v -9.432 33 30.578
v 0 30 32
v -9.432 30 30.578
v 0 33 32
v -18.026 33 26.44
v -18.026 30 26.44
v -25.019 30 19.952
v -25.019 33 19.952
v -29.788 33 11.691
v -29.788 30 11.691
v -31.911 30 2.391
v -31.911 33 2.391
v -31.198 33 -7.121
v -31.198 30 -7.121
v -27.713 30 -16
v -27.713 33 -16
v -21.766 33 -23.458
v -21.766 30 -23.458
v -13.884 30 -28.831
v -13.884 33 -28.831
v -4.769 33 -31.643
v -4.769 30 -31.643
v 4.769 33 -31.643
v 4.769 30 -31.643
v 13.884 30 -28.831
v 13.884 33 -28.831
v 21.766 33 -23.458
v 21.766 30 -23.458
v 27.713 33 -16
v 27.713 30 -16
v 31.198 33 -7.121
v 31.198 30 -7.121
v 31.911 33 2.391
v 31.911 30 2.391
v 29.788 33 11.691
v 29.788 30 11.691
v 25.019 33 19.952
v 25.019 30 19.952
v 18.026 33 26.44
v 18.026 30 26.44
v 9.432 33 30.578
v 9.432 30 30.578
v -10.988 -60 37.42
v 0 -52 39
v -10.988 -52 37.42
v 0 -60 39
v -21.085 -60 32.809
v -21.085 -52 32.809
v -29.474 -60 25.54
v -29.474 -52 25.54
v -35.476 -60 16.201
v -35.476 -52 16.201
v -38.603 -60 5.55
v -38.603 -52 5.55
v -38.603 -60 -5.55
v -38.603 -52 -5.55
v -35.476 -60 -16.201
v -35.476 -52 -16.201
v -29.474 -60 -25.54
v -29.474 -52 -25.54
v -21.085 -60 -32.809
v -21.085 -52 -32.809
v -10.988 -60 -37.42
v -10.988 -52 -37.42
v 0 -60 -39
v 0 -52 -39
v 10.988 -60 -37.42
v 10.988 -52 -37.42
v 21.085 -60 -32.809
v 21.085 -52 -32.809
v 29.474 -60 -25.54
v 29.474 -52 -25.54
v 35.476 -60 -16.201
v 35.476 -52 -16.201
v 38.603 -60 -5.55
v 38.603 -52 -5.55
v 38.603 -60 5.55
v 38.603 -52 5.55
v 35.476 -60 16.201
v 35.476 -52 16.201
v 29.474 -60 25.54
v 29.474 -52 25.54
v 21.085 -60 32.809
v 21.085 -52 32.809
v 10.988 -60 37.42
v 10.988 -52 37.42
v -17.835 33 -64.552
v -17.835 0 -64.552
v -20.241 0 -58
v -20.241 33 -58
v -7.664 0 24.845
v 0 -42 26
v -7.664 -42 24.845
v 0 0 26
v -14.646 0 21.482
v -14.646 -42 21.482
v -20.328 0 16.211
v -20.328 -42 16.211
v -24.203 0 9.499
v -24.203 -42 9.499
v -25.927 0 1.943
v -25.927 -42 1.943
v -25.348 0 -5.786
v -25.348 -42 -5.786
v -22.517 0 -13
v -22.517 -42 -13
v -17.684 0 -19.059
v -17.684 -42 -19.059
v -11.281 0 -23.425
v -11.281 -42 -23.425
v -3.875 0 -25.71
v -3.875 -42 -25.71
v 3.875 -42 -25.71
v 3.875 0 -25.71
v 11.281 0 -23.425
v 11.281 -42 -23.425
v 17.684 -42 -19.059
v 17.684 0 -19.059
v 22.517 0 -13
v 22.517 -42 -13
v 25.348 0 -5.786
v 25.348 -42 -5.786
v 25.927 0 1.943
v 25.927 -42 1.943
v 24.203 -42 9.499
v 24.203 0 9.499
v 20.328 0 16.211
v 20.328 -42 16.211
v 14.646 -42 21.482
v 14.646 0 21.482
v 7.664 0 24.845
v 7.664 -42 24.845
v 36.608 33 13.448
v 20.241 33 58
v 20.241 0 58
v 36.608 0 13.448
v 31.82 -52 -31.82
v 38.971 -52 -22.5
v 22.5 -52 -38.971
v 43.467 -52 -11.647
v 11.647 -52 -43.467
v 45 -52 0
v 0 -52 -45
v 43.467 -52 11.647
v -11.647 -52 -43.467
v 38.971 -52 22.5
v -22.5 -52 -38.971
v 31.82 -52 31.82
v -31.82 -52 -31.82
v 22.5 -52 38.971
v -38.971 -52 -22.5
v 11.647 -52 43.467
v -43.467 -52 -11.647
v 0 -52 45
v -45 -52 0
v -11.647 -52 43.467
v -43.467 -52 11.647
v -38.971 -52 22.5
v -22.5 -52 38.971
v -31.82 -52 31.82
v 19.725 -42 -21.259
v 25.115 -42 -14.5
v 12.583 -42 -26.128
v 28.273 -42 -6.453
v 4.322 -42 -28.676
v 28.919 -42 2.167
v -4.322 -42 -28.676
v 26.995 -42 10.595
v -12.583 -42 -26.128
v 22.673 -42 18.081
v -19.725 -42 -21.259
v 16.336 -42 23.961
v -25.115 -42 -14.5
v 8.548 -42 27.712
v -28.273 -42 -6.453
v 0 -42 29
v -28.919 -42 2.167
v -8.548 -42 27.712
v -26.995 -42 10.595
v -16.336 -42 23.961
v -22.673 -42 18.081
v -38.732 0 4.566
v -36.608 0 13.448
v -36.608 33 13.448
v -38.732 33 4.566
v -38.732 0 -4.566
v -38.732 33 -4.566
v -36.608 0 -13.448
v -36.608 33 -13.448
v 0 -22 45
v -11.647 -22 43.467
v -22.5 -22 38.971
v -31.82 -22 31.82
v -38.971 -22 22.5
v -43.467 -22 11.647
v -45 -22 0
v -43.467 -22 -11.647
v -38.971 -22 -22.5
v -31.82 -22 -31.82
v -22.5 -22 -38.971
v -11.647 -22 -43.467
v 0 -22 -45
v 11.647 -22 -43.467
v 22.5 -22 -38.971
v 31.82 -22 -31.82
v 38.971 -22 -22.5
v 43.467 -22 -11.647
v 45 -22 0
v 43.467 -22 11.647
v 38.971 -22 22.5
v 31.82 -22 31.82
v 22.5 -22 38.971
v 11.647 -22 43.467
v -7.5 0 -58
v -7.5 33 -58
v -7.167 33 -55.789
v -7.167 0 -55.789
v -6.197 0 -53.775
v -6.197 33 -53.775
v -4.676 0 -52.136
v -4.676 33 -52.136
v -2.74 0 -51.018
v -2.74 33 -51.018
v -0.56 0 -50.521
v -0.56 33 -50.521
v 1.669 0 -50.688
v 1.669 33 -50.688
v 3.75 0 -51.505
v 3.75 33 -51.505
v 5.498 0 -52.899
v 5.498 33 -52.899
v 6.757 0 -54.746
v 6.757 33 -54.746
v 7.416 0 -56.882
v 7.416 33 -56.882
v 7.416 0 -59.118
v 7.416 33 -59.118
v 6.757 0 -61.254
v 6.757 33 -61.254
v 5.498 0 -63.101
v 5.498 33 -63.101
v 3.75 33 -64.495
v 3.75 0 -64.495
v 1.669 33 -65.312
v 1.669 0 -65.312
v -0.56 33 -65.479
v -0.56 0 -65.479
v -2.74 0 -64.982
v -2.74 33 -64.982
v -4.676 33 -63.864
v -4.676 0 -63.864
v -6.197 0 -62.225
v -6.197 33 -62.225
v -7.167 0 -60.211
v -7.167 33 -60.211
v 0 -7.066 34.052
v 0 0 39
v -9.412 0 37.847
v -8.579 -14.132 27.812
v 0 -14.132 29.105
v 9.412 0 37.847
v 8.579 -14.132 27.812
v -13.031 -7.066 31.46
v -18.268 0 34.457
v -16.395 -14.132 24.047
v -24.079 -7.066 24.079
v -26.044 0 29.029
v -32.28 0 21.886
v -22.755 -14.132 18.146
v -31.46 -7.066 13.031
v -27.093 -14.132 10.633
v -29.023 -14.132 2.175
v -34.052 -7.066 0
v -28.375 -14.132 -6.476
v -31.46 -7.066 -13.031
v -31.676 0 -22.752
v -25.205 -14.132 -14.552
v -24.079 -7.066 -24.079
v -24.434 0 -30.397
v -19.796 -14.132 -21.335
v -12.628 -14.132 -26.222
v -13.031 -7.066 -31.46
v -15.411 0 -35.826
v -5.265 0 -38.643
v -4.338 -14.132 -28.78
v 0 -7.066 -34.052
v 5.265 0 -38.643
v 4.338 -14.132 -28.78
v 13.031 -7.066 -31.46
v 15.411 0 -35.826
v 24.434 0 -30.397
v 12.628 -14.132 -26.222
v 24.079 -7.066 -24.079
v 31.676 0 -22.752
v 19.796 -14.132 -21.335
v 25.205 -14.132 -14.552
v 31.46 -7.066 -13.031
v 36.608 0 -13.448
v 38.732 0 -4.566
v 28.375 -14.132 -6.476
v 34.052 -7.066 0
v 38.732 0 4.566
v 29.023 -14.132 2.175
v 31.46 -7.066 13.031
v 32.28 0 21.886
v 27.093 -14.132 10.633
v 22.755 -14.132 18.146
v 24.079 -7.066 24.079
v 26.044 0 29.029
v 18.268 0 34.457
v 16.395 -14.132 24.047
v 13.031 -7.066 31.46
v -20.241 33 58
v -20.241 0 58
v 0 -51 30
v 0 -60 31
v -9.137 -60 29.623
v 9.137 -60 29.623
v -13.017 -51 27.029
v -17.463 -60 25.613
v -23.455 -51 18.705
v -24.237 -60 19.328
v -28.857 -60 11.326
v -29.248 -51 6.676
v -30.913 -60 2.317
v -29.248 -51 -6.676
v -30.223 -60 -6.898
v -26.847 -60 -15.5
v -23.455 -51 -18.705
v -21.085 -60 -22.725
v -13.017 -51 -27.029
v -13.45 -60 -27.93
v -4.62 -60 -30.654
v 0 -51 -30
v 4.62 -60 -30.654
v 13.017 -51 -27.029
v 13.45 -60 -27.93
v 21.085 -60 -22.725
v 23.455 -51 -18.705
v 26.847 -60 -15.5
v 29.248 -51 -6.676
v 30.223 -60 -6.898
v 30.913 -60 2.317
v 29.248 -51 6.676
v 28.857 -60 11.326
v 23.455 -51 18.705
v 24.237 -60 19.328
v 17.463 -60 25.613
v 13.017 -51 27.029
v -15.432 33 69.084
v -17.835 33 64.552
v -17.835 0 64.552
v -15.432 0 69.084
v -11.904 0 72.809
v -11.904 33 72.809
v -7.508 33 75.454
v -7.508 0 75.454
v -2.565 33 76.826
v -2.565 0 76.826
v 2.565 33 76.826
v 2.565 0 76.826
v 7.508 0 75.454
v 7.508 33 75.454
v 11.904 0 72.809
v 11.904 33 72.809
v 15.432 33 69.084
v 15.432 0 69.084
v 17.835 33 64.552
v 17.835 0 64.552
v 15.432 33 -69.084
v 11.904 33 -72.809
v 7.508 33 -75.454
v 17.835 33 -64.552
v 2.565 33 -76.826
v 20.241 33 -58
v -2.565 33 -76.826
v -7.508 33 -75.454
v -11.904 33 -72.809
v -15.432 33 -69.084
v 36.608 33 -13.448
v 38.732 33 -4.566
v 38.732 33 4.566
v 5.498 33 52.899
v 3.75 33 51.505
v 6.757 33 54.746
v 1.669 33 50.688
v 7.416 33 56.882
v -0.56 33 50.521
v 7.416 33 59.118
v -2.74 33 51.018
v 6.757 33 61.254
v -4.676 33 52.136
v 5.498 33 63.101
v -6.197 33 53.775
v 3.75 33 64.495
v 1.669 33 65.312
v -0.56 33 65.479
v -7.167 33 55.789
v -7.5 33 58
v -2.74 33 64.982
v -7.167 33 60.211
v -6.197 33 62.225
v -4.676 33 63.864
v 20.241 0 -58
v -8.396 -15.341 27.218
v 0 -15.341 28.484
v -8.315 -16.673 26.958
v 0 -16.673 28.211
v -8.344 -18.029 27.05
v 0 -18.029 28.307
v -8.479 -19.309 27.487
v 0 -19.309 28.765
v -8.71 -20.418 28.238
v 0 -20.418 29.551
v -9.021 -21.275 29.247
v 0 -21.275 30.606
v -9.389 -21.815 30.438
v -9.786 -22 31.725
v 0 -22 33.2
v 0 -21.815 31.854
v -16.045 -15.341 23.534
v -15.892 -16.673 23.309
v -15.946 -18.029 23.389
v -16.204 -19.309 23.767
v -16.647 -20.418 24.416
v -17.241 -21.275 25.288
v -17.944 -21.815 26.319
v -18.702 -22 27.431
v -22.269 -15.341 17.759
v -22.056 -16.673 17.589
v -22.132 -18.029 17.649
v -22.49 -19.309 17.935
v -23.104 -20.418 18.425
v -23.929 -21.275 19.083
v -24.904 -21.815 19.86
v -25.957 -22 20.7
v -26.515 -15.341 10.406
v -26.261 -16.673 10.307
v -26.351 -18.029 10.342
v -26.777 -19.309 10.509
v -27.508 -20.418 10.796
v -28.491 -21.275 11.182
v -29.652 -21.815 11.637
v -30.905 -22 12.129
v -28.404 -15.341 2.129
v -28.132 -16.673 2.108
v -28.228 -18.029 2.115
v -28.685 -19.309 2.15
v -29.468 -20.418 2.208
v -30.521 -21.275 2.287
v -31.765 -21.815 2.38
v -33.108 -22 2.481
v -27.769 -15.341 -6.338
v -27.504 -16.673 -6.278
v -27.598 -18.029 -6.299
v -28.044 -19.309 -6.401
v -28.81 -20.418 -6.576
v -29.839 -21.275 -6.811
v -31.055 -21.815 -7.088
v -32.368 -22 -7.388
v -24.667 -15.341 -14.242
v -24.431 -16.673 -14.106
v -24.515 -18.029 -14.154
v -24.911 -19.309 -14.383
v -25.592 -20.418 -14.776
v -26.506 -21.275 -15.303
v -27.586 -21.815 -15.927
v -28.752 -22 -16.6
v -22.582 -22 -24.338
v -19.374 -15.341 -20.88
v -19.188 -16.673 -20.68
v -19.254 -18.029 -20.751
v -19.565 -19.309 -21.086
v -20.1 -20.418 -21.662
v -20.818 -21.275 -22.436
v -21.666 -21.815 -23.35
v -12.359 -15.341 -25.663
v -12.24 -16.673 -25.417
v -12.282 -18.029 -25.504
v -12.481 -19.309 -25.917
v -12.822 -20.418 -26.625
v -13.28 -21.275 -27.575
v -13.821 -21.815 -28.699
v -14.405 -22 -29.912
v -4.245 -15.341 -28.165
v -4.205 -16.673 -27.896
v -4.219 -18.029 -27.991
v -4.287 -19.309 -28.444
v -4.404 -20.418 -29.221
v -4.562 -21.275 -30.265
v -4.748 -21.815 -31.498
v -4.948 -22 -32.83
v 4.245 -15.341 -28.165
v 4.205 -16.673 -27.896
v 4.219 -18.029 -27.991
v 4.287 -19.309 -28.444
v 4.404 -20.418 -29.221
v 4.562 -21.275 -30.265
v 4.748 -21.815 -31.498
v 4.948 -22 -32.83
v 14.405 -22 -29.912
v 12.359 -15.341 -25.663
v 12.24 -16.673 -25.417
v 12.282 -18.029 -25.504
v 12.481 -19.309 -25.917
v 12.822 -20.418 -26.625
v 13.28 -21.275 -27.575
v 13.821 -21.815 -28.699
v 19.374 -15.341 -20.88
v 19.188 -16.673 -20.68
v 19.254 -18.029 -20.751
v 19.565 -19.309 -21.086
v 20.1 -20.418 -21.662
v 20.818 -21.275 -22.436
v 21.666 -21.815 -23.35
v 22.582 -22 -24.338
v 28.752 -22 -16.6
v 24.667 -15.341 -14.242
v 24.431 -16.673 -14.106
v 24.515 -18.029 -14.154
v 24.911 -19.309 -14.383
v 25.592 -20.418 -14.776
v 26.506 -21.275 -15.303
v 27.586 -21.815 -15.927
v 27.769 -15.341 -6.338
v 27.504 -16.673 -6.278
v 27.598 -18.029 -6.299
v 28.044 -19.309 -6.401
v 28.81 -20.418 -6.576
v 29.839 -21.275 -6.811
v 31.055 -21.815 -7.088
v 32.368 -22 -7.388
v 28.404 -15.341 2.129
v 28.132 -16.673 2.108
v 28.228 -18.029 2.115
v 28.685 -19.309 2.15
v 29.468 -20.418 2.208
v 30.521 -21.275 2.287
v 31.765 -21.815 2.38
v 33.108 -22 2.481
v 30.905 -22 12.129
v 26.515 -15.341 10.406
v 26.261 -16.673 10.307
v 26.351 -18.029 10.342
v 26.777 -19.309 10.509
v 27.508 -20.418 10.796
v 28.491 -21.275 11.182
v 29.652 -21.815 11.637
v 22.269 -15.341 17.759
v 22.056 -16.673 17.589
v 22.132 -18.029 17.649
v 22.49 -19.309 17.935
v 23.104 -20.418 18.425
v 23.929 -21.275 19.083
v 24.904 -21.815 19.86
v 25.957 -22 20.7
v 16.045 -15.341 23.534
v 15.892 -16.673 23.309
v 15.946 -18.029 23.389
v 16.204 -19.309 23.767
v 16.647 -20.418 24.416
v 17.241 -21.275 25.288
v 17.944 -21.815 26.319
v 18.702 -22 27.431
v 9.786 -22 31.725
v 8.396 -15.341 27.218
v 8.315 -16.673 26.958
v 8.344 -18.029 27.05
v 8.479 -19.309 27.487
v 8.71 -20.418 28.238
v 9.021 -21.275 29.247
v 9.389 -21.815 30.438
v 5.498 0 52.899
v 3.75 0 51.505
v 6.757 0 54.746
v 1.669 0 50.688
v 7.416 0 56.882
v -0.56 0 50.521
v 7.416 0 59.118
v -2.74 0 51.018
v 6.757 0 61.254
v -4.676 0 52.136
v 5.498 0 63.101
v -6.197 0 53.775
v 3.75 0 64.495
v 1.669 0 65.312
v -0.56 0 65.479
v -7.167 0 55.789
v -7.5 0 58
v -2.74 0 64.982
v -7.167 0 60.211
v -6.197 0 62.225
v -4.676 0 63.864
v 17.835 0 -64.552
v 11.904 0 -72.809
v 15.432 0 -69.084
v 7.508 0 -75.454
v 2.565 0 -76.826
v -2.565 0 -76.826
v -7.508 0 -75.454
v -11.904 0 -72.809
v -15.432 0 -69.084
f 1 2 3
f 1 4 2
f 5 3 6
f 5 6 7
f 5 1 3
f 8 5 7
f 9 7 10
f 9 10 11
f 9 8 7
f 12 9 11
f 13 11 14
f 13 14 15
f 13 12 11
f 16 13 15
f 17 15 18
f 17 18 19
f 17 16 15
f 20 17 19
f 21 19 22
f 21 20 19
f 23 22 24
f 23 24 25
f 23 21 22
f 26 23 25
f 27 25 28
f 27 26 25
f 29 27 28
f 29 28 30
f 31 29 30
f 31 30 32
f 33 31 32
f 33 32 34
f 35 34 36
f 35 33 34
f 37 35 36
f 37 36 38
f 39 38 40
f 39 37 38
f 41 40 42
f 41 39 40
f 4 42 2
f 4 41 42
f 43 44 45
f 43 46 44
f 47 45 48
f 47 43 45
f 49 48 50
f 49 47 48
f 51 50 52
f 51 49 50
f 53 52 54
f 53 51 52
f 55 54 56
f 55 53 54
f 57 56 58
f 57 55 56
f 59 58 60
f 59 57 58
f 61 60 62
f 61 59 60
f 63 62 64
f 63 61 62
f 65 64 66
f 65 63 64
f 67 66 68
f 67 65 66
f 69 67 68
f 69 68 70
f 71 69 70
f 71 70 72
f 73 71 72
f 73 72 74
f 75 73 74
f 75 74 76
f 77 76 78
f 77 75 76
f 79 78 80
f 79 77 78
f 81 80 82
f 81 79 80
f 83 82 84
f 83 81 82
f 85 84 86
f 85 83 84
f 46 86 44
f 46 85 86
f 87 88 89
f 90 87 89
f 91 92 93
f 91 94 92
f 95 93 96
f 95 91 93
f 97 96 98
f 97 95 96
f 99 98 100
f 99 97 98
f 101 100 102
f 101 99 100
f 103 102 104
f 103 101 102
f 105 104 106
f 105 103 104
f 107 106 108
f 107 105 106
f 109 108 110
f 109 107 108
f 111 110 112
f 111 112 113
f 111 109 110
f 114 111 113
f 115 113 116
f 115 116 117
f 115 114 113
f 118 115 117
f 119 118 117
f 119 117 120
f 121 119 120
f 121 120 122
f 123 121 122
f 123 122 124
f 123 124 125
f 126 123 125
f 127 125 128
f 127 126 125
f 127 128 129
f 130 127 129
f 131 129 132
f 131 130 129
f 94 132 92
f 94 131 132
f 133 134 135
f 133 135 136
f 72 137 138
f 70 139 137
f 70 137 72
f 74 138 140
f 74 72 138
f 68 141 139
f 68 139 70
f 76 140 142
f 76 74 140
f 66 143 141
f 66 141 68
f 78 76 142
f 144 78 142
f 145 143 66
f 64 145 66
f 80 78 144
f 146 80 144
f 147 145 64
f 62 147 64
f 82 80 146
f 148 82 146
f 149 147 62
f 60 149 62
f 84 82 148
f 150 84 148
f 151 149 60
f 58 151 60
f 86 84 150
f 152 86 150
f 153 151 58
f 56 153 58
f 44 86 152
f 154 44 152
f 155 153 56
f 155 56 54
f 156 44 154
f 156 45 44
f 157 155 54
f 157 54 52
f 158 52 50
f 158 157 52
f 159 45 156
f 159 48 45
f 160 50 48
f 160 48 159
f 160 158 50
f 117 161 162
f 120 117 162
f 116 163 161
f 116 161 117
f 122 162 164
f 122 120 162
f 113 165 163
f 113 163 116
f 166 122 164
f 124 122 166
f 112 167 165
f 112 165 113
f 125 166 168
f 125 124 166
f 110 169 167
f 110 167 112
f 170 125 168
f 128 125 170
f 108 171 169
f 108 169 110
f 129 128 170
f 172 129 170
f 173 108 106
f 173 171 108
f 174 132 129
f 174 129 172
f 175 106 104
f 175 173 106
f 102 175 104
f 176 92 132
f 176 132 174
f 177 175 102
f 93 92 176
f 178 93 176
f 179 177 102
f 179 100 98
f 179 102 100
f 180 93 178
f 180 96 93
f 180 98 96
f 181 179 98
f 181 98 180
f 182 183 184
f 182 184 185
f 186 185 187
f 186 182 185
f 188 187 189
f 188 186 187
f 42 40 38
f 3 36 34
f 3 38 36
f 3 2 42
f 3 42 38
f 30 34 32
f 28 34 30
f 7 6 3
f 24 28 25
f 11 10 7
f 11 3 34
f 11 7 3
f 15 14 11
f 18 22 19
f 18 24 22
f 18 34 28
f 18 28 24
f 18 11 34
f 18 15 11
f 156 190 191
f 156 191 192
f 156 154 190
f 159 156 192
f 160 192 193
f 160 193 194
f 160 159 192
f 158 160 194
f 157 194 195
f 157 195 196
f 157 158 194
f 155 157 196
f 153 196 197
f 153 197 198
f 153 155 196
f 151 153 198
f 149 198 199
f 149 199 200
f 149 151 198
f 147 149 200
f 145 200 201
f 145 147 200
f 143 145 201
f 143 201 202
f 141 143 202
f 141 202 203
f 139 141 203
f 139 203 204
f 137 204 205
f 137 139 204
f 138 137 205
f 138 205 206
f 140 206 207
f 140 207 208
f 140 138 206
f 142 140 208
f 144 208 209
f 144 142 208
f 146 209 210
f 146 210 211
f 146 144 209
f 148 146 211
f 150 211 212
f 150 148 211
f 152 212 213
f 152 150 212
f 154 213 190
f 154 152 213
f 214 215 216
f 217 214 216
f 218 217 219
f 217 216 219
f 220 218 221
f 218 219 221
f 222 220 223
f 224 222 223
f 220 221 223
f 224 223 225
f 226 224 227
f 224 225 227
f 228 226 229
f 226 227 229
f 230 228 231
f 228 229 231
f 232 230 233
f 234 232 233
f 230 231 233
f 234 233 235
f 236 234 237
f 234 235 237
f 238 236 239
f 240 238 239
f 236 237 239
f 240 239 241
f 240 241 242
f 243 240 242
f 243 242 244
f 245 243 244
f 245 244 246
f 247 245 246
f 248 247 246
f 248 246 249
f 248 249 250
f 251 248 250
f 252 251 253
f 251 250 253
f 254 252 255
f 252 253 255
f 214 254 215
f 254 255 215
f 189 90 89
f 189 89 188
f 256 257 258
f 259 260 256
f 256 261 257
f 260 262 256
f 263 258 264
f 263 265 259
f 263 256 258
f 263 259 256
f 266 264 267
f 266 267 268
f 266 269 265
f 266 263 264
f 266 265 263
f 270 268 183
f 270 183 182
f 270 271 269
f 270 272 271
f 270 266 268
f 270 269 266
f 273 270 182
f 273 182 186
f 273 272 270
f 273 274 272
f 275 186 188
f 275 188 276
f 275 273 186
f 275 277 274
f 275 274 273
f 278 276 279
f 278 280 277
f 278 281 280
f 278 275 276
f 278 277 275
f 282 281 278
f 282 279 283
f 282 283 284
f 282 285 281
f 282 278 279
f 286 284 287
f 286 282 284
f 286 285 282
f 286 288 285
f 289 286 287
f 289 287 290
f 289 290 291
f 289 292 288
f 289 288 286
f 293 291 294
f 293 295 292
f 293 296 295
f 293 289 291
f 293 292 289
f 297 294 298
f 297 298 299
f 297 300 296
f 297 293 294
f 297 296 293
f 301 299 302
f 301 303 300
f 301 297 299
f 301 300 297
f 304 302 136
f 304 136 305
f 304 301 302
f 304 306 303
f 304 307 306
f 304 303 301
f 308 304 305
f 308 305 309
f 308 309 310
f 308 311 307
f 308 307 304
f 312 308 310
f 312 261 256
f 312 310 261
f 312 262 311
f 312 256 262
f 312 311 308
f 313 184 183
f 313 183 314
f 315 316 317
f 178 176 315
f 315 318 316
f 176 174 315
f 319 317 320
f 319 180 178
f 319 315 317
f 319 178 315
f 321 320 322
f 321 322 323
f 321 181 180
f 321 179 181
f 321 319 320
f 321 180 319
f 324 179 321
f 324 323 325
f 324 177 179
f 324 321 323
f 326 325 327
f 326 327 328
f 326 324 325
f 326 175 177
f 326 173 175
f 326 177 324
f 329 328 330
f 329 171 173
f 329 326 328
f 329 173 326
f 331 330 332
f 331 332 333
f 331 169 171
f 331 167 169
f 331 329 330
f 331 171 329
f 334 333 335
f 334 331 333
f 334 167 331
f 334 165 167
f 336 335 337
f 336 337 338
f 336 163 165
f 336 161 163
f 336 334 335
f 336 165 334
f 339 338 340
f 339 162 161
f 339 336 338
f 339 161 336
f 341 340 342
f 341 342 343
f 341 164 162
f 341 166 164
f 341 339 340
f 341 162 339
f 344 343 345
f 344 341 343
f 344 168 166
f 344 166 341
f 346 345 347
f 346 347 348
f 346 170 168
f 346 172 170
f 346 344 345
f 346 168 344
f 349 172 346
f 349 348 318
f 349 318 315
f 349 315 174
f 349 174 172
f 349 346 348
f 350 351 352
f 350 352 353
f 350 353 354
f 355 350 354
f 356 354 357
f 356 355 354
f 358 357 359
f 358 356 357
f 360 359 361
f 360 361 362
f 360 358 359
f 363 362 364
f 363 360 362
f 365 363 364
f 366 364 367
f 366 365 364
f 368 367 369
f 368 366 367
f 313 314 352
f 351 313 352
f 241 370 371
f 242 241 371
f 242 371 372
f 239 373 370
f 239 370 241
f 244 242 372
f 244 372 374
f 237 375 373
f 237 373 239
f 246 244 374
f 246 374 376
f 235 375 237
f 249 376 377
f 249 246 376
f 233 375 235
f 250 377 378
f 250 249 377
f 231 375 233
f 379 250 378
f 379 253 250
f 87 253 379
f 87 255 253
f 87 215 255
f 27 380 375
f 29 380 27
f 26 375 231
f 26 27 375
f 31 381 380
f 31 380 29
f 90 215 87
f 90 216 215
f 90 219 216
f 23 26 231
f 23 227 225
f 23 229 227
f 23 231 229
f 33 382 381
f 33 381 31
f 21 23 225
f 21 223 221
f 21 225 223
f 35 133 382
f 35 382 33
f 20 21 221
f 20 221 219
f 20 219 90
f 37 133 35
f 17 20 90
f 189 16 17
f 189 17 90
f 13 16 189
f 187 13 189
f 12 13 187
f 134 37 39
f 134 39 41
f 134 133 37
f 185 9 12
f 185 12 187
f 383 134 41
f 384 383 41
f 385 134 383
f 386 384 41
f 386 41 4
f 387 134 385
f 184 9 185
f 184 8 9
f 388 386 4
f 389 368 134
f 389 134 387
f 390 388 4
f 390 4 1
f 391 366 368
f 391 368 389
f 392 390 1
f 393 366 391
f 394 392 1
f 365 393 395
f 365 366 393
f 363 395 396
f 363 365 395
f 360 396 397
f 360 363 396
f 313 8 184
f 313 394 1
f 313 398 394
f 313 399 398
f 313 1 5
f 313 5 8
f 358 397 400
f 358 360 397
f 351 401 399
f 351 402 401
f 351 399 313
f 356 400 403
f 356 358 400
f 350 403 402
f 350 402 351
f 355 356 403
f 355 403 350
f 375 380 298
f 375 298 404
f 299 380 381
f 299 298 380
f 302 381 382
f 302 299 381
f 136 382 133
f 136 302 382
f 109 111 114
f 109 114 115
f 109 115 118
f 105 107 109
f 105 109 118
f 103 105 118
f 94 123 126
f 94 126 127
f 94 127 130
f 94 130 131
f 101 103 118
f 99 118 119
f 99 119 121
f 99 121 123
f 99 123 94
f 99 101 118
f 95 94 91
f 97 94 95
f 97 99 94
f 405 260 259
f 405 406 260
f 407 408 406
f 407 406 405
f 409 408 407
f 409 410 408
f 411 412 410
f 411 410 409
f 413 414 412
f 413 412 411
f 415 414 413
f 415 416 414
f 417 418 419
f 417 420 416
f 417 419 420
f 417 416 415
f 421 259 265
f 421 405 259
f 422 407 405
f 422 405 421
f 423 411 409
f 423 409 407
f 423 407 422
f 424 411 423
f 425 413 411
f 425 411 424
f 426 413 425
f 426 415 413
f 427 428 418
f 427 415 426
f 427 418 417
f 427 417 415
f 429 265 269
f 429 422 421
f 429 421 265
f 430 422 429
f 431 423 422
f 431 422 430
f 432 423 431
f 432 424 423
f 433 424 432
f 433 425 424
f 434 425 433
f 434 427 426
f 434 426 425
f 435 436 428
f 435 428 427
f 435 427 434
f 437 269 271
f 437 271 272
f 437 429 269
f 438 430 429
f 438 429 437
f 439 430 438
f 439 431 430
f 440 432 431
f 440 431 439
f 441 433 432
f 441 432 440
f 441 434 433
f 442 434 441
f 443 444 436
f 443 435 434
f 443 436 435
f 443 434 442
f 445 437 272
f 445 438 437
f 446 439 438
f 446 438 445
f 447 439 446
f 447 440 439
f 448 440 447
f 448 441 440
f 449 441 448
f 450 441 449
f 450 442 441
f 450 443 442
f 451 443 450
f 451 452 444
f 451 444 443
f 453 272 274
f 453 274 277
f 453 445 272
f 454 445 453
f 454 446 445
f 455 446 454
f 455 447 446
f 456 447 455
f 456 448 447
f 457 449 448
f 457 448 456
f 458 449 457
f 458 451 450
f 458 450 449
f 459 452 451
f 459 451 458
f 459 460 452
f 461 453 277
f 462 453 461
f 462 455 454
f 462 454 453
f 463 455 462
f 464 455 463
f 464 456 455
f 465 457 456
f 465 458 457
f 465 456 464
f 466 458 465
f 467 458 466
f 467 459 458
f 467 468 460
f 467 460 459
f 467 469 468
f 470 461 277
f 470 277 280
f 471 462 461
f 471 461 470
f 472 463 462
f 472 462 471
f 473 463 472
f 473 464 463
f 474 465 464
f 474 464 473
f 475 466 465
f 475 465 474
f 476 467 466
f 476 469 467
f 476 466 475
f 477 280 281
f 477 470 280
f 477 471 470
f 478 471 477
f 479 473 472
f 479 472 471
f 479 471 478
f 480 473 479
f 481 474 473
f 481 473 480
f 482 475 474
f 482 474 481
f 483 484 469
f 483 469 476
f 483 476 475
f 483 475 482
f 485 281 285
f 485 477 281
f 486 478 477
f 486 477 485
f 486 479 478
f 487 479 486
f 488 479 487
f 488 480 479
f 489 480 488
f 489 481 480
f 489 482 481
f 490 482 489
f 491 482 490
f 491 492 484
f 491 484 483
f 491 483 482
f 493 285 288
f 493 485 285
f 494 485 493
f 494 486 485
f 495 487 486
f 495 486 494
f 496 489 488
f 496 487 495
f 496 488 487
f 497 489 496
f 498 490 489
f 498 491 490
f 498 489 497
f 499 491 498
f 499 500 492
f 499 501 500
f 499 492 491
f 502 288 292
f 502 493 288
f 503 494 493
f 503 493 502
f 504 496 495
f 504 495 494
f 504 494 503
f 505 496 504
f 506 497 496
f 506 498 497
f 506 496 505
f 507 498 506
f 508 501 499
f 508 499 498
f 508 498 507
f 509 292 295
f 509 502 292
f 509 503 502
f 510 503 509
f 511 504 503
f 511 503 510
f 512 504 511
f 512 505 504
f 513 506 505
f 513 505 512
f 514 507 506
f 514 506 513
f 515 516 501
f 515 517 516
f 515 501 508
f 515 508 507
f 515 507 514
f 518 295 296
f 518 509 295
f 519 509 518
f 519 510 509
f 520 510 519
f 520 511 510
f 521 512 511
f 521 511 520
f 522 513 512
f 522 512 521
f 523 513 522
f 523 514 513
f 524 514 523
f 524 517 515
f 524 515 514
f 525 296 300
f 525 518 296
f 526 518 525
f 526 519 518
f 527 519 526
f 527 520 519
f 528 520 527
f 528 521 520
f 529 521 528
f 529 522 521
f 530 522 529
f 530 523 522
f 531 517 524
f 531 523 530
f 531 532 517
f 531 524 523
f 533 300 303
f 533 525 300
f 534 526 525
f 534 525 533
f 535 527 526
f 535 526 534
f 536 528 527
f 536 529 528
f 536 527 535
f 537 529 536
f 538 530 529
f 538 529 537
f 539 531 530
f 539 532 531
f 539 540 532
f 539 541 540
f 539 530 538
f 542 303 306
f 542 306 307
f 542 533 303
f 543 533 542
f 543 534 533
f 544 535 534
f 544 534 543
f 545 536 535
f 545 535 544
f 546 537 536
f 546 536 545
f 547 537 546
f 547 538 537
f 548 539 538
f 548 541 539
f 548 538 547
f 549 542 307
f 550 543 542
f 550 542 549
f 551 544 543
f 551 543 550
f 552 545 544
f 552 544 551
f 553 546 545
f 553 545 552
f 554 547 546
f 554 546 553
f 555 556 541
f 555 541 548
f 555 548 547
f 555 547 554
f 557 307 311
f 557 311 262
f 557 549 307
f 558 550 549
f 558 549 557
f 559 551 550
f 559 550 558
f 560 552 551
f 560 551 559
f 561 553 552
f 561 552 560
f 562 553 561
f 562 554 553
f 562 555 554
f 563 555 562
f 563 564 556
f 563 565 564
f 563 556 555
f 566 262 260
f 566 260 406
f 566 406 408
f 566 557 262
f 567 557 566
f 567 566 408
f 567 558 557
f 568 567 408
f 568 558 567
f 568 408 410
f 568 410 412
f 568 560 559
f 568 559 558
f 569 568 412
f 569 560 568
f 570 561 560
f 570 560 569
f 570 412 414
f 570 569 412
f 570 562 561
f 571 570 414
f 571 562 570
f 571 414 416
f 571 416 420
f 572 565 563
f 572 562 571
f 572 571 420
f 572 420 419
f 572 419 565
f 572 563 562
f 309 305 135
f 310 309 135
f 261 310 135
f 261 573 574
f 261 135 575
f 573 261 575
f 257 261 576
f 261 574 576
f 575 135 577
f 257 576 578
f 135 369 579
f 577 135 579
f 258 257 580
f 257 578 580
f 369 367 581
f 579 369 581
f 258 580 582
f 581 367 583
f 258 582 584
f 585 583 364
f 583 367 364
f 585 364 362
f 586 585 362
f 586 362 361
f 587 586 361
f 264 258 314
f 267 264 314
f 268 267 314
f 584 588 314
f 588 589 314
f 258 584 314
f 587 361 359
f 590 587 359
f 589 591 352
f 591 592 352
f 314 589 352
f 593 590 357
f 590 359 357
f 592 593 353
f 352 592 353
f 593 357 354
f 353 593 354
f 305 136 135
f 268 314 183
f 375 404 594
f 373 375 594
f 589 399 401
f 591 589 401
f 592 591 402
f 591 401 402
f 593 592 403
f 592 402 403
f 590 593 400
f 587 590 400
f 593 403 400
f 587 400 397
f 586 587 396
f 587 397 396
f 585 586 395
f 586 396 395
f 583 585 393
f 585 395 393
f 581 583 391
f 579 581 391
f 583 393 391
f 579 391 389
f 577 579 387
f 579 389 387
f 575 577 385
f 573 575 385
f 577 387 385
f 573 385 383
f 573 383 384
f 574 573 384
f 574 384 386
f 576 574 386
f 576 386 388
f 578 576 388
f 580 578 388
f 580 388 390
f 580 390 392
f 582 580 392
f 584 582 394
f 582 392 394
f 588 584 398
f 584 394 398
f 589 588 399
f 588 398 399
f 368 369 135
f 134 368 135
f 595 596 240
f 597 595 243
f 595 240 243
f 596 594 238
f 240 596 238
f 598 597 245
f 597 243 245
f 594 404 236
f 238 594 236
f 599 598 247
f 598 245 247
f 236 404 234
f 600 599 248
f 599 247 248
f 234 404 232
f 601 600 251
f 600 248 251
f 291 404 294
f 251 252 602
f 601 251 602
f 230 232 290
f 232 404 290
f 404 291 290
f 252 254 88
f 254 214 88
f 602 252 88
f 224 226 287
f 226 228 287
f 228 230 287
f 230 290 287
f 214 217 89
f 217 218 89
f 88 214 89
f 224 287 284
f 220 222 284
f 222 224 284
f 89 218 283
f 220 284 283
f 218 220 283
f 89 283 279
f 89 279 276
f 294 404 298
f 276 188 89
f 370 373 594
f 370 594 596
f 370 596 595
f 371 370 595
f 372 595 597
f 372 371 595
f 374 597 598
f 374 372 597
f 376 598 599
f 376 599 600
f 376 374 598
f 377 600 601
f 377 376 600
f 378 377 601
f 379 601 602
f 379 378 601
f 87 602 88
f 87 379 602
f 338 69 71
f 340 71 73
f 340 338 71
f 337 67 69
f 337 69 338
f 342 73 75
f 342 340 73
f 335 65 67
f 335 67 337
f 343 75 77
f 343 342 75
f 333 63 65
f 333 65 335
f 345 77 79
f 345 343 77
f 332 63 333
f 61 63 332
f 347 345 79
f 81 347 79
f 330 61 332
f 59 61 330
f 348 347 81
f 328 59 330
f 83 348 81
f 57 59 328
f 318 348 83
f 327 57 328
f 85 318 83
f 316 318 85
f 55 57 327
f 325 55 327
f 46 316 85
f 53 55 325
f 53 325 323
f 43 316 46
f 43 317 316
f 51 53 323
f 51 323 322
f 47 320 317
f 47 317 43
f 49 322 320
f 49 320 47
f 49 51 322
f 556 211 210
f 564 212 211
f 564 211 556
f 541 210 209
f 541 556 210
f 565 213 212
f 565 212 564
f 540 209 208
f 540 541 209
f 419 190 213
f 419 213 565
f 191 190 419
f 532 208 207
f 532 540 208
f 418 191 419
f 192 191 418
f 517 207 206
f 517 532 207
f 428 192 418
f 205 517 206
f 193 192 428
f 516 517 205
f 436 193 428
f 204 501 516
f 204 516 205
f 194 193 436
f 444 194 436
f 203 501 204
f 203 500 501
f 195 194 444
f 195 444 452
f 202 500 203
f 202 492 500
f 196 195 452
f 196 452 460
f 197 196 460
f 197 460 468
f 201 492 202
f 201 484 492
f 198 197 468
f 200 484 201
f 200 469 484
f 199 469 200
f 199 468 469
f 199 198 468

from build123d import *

# Parameters (mm, degrees)
F2_R     = 7.5
F3_DEPTH = 33


with BuildPart() as f1:
    # F0 (on Right) → F1 (revolve)
    with BuildSketch(Plane.YZ):
        with BuildLine():
            Line((-60, 39), (-60, 31))
            Line((-60, 31), (-42, 29))
            Line((-42, 29), (-42, 26))
            Line((-42, 26), (0, 26))
            Line((0, 26), (0, 0))
            Line((0, 0), (30, 0))
            Line((30, 0), (30, 32))
            Line((30, 32), (33, 32))
            Line((33, 32), (33, 39))
            Line((33, 39), (0, 39))
            Line((0, 39), (-14.1321178182, 29.1045845728))
            ThreePointArc((-14.1321178182, 29.1045845728), (-19.3087430662, 28.7652906284), (-22, 33.2003447942))
            Line((-22, 33.2003447942), (-22, 45))
            Line((-22, 45), (-52, 45))
            Line((-52, 45), (-52, 39))
            Line((-52, 39), (-60, 39))
        make_face()
    revolve(axis=Axis((0, 15, 0), (0, -1, 0)))

    # F2 (on face) → F3 (join)
    with BuildSketch(Plane(origin=(0, 33, 0), x_dir=(-1, 0, 0), z_dir=(0, 1, 0))):
        with BuildLine():
            Line((20.2414907731, 58), (17.8346547716, 64.5517241379))
            ThreePointArc((17.8346547716, 64.5517241379), (0, 77), (-17.8346547716, 64.5517241379))
            Line((-17.8346547716, 64.5517241379), (-20.2414907731, 58))
            Line((-20.2414907731, 58), (-36.6079755837, 13.4482758621))
            ThreePointArc((-36.6079755837, 13.4482758621), (0, 39), (36.6079755837, 13.4482758621))
            Line((36.6079755837, 13.4482758621), (20.2414907731, 58))
        make_face()
        with Locations((0, 58)):
            Circle(F2_R, mode=Mode.SUBTRACT)
        with BuildLine():
            ThreePointArc((36.6079755837, -13.4482758621), (0, -39), (-36.6079755837, -13.4482758621))
            Line((-36.6079755837, -13.4482758621), (-20.2414907731, -58))
            Line((-20.2414907731, -58), (-17.8346547716, -64.5517241379))
            ThreePointArc((-17.8346547716, -64.5517241379), (0, -77), (17.8346547716, -64.5517241379))
            Line((17.8346547716, -64.5517241379), (20.2414907731, -58))
            Line((20.2414907731, -58), (36.6079755837, -13.4482758621))
        make_face()
        with Locations((0, -58)):
            Circle(F2_R, mode=Mode.SUBTRACT)
    extrude(amount=-F3_DEPTH)


solid = f1.part
